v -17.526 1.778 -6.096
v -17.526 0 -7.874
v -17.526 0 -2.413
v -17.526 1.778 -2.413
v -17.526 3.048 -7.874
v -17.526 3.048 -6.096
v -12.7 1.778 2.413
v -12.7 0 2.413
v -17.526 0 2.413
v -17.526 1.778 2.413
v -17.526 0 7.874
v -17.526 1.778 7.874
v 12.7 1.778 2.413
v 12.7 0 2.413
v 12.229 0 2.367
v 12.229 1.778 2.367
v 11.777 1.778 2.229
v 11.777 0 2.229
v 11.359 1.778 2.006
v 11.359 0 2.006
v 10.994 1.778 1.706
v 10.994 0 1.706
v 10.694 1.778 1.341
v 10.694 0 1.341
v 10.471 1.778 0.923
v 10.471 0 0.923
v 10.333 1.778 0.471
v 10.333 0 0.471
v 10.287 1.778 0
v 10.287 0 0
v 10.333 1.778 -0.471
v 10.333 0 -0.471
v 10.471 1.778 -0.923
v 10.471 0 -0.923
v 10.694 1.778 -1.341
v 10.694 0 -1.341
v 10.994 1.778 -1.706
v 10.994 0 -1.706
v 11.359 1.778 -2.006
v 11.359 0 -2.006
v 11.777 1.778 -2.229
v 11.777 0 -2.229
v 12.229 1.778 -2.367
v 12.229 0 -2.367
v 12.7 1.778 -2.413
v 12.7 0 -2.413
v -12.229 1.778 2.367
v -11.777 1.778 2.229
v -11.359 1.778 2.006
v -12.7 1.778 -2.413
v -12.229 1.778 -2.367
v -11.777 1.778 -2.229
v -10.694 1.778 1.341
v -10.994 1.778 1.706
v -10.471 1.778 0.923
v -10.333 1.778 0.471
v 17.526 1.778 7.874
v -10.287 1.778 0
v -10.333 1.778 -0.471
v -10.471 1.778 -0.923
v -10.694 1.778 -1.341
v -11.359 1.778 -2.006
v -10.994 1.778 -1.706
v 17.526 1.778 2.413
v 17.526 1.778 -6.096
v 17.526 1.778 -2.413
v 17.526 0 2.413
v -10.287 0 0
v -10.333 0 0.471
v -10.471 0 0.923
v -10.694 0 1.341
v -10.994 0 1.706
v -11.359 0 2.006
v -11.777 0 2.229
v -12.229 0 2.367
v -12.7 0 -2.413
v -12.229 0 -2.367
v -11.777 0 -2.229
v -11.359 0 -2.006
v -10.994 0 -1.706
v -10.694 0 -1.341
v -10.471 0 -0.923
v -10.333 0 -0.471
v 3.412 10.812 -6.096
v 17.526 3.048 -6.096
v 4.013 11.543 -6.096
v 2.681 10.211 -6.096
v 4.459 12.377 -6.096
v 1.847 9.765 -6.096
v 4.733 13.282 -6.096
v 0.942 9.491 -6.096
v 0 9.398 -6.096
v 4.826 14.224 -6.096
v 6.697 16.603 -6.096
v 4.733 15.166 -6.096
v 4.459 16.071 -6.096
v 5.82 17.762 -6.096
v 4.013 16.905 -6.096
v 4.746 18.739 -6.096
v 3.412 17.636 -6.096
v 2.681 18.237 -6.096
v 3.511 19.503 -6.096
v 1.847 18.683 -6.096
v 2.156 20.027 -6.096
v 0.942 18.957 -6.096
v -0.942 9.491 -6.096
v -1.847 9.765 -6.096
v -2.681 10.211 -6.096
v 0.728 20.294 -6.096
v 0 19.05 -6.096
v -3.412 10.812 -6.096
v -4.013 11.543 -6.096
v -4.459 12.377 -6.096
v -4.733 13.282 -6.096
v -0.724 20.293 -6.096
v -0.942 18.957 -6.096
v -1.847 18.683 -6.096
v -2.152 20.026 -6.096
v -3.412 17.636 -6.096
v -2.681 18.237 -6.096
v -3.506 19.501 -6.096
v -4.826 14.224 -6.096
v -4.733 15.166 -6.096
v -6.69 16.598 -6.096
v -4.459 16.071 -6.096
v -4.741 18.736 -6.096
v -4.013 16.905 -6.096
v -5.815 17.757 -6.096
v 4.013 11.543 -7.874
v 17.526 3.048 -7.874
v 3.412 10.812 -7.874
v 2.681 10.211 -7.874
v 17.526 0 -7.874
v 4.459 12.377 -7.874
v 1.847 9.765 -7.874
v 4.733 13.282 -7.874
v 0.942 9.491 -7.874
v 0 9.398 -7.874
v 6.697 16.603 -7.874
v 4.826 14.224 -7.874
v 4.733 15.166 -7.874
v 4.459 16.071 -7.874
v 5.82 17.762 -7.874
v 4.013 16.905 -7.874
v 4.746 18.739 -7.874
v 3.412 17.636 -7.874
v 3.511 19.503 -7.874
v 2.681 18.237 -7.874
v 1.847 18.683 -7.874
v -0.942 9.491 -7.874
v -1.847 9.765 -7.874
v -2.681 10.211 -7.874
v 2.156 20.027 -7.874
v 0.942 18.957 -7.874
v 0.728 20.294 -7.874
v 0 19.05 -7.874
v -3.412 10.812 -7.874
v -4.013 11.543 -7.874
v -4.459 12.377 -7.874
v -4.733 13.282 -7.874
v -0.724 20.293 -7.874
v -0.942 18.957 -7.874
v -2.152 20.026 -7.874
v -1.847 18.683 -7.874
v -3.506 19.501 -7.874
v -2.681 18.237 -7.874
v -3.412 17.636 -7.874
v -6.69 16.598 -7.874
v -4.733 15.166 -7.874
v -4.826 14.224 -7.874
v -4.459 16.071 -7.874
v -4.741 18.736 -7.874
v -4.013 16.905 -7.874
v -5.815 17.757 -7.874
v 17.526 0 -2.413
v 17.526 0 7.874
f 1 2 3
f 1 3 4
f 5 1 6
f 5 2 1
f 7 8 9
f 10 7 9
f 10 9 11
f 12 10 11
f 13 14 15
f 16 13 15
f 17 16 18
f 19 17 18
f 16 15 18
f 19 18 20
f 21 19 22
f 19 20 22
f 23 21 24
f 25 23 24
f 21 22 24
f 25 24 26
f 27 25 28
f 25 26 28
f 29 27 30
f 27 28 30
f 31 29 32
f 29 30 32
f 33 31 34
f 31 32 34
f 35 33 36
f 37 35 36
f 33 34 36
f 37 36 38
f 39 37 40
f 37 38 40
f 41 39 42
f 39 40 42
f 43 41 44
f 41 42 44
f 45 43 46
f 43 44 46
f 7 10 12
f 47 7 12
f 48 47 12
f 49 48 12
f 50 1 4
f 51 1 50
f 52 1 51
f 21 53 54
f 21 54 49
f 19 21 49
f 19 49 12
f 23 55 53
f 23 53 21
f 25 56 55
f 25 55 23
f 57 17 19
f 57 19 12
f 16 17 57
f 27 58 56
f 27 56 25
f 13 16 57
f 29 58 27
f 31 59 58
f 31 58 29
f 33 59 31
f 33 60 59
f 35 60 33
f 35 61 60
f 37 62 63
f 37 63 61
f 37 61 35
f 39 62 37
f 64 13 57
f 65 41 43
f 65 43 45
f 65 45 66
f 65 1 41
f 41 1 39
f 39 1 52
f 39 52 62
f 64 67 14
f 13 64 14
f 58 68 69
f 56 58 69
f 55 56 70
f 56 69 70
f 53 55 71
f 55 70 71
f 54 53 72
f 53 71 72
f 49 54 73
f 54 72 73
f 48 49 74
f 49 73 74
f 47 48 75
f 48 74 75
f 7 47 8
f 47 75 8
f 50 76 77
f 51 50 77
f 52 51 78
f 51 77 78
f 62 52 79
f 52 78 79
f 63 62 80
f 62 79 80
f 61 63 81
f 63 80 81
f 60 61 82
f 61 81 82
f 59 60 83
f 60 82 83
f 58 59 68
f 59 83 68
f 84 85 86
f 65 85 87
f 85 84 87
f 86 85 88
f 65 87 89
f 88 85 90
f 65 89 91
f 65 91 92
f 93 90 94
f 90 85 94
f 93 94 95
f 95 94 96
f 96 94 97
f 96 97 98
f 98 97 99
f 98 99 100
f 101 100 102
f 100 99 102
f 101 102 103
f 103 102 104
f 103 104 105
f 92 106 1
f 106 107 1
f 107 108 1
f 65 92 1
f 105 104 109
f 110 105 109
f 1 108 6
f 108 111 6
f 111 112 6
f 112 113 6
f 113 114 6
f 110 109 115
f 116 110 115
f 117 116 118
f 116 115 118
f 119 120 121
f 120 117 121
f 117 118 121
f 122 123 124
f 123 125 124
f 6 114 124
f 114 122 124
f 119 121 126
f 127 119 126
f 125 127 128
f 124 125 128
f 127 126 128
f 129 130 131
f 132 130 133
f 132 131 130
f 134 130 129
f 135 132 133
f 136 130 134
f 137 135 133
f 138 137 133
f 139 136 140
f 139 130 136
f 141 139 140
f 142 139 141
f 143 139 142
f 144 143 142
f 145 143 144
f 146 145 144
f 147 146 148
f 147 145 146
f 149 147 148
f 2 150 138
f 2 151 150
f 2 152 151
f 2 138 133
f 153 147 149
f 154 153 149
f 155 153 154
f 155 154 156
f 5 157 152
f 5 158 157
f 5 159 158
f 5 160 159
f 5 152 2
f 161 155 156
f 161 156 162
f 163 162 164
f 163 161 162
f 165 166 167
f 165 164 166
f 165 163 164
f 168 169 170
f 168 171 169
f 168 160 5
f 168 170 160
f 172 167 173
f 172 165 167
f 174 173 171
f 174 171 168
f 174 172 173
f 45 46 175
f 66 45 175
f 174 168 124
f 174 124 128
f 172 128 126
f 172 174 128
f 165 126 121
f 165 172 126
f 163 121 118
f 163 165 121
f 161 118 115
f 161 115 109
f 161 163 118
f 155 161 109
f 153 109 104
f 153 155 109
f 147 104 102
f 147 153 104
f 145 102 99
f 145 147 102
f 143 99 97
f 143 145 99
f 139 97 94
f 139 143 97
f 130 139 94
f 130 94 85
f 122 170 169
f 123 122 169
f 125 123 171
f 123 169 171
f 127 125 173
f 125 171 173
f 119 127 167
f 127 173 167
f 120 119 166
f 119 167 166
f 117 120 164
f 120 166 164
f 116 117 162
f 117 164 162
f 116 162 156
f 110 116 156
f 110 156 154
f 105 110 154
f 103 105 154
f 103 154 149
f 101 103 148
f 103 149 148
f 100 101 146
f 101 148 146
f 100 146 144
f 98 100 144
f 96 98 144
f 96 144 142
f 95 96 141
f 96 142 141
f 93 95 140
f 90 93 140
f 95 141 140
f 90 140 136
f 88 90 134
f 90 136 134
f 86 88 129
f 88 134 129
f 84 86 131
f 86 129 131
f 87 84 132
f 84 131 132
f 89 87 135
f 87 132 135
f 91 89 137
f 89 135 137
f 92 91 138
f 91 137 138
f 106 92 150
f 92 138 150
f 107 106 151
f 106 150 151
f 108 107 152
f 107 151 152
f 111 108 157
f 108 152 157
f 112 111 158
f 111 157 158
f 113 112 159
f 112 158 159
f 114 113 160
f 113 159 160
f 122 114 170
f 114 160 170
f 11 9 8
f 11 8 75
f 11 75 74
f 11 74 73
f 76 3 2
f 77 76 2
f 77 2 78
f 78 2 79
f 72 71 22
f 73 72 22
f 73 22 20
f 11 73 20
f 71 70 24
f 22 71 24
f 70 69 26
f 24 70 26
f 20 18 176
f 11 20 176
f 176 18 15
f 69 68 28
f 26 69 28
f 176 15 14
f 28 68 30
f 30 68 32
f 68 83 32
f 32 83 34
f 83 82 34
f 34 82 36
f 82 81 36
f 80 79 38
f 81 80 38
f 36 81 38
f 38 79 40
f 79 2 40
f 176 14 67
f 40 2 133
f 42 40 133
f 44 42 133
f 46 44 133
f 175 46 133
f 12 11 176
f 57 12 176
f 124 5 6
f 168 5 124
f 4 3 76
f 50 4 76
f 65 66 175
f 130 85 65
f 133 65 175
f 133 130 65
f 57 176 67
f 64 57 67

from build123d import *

# Parameters (mm, degrees)
BOSS_EXTRUDE1_DEPTH = 1.778
SKETCH3_R           = 4.826
BOSS_EXTRUDE2_DEPTH = 1.778


with BuildPart() as part:
    # Sketch1 → Boss-Extrude1 (new body)
    with BuildSketch(Plane(origin=(0, 0, 0), x_dir=(1, 0, 0), z_dir=(0, 1, 0))):
        with BuildLine():
            Line((-17.526, 2.413), (-12.7, 2.413))
            ThreePointArc((-12.7, 2.413), (-10.993751337, 1.706248663), (-10.287, 0))
            ThreePointArc((-10.287, 0), (-10.993751337, -1.706248663), (-12.7, -2.413))
            Line((-12.7, -2.413), (-17.526, -2.413))
            Line((-17.526, -2.413), (-17.526, -7.874))
            Line((-17.526, -7.874), (17.526, -7.874))
            Line((17.526, -7.874), (17.526, -2.413))
            Line((17.526, -2.413), (12.7, -2.413))
            ThreePointArc((12.7, -2.413), (10.287, 0), (12.7, 2.413))
            Line((12.7, 2.413), (17.526, 2.413))
            Line((17.526, 2.413), (17.526, 7.874))
            Line((17.526, 7.874), (0, 7.874))
            Line((0, 7.874), (-17.526, 7.874))
            Line((-17.526, 7.874), (-17.526, 2.413))
        make_face()
    extrude(amount=BOSS_EXTRUDE1_DEPTH)

    # Sketch3 → Boss-Extrude2 (add)
    with BuildSketch(Plane(origin=(0, 0, -7.874), x_dir=(-1, 0, 0), z_dir=(0, 0, -1))):
        with BuildLine():
            Line((17.526, 3.048), (6.689775541, 16.597652846))
            ThreePointArc((6.689775541, 16.597652846), (-0.001876966, 20.326885902), (-6.696539897, 16.603059817))
            Line((-6.696539897, 16.603059817), (-17.526, 3.048))
            Line((-17.526, 3.048), (-17.526, 1.778))
            Line((-17.526, 1.778), (17.526, 1.778))
            Line((17.526, 1.778), (17.526, 3.048))
        make_face()
        with Locations((0, 14.224)):
            Circle(SKETCH3_R, mode=Mode.SUBTRACT)
    extrude(amount=-BOSS_EXTRUDE2_DEPTH)


solid = part.part
